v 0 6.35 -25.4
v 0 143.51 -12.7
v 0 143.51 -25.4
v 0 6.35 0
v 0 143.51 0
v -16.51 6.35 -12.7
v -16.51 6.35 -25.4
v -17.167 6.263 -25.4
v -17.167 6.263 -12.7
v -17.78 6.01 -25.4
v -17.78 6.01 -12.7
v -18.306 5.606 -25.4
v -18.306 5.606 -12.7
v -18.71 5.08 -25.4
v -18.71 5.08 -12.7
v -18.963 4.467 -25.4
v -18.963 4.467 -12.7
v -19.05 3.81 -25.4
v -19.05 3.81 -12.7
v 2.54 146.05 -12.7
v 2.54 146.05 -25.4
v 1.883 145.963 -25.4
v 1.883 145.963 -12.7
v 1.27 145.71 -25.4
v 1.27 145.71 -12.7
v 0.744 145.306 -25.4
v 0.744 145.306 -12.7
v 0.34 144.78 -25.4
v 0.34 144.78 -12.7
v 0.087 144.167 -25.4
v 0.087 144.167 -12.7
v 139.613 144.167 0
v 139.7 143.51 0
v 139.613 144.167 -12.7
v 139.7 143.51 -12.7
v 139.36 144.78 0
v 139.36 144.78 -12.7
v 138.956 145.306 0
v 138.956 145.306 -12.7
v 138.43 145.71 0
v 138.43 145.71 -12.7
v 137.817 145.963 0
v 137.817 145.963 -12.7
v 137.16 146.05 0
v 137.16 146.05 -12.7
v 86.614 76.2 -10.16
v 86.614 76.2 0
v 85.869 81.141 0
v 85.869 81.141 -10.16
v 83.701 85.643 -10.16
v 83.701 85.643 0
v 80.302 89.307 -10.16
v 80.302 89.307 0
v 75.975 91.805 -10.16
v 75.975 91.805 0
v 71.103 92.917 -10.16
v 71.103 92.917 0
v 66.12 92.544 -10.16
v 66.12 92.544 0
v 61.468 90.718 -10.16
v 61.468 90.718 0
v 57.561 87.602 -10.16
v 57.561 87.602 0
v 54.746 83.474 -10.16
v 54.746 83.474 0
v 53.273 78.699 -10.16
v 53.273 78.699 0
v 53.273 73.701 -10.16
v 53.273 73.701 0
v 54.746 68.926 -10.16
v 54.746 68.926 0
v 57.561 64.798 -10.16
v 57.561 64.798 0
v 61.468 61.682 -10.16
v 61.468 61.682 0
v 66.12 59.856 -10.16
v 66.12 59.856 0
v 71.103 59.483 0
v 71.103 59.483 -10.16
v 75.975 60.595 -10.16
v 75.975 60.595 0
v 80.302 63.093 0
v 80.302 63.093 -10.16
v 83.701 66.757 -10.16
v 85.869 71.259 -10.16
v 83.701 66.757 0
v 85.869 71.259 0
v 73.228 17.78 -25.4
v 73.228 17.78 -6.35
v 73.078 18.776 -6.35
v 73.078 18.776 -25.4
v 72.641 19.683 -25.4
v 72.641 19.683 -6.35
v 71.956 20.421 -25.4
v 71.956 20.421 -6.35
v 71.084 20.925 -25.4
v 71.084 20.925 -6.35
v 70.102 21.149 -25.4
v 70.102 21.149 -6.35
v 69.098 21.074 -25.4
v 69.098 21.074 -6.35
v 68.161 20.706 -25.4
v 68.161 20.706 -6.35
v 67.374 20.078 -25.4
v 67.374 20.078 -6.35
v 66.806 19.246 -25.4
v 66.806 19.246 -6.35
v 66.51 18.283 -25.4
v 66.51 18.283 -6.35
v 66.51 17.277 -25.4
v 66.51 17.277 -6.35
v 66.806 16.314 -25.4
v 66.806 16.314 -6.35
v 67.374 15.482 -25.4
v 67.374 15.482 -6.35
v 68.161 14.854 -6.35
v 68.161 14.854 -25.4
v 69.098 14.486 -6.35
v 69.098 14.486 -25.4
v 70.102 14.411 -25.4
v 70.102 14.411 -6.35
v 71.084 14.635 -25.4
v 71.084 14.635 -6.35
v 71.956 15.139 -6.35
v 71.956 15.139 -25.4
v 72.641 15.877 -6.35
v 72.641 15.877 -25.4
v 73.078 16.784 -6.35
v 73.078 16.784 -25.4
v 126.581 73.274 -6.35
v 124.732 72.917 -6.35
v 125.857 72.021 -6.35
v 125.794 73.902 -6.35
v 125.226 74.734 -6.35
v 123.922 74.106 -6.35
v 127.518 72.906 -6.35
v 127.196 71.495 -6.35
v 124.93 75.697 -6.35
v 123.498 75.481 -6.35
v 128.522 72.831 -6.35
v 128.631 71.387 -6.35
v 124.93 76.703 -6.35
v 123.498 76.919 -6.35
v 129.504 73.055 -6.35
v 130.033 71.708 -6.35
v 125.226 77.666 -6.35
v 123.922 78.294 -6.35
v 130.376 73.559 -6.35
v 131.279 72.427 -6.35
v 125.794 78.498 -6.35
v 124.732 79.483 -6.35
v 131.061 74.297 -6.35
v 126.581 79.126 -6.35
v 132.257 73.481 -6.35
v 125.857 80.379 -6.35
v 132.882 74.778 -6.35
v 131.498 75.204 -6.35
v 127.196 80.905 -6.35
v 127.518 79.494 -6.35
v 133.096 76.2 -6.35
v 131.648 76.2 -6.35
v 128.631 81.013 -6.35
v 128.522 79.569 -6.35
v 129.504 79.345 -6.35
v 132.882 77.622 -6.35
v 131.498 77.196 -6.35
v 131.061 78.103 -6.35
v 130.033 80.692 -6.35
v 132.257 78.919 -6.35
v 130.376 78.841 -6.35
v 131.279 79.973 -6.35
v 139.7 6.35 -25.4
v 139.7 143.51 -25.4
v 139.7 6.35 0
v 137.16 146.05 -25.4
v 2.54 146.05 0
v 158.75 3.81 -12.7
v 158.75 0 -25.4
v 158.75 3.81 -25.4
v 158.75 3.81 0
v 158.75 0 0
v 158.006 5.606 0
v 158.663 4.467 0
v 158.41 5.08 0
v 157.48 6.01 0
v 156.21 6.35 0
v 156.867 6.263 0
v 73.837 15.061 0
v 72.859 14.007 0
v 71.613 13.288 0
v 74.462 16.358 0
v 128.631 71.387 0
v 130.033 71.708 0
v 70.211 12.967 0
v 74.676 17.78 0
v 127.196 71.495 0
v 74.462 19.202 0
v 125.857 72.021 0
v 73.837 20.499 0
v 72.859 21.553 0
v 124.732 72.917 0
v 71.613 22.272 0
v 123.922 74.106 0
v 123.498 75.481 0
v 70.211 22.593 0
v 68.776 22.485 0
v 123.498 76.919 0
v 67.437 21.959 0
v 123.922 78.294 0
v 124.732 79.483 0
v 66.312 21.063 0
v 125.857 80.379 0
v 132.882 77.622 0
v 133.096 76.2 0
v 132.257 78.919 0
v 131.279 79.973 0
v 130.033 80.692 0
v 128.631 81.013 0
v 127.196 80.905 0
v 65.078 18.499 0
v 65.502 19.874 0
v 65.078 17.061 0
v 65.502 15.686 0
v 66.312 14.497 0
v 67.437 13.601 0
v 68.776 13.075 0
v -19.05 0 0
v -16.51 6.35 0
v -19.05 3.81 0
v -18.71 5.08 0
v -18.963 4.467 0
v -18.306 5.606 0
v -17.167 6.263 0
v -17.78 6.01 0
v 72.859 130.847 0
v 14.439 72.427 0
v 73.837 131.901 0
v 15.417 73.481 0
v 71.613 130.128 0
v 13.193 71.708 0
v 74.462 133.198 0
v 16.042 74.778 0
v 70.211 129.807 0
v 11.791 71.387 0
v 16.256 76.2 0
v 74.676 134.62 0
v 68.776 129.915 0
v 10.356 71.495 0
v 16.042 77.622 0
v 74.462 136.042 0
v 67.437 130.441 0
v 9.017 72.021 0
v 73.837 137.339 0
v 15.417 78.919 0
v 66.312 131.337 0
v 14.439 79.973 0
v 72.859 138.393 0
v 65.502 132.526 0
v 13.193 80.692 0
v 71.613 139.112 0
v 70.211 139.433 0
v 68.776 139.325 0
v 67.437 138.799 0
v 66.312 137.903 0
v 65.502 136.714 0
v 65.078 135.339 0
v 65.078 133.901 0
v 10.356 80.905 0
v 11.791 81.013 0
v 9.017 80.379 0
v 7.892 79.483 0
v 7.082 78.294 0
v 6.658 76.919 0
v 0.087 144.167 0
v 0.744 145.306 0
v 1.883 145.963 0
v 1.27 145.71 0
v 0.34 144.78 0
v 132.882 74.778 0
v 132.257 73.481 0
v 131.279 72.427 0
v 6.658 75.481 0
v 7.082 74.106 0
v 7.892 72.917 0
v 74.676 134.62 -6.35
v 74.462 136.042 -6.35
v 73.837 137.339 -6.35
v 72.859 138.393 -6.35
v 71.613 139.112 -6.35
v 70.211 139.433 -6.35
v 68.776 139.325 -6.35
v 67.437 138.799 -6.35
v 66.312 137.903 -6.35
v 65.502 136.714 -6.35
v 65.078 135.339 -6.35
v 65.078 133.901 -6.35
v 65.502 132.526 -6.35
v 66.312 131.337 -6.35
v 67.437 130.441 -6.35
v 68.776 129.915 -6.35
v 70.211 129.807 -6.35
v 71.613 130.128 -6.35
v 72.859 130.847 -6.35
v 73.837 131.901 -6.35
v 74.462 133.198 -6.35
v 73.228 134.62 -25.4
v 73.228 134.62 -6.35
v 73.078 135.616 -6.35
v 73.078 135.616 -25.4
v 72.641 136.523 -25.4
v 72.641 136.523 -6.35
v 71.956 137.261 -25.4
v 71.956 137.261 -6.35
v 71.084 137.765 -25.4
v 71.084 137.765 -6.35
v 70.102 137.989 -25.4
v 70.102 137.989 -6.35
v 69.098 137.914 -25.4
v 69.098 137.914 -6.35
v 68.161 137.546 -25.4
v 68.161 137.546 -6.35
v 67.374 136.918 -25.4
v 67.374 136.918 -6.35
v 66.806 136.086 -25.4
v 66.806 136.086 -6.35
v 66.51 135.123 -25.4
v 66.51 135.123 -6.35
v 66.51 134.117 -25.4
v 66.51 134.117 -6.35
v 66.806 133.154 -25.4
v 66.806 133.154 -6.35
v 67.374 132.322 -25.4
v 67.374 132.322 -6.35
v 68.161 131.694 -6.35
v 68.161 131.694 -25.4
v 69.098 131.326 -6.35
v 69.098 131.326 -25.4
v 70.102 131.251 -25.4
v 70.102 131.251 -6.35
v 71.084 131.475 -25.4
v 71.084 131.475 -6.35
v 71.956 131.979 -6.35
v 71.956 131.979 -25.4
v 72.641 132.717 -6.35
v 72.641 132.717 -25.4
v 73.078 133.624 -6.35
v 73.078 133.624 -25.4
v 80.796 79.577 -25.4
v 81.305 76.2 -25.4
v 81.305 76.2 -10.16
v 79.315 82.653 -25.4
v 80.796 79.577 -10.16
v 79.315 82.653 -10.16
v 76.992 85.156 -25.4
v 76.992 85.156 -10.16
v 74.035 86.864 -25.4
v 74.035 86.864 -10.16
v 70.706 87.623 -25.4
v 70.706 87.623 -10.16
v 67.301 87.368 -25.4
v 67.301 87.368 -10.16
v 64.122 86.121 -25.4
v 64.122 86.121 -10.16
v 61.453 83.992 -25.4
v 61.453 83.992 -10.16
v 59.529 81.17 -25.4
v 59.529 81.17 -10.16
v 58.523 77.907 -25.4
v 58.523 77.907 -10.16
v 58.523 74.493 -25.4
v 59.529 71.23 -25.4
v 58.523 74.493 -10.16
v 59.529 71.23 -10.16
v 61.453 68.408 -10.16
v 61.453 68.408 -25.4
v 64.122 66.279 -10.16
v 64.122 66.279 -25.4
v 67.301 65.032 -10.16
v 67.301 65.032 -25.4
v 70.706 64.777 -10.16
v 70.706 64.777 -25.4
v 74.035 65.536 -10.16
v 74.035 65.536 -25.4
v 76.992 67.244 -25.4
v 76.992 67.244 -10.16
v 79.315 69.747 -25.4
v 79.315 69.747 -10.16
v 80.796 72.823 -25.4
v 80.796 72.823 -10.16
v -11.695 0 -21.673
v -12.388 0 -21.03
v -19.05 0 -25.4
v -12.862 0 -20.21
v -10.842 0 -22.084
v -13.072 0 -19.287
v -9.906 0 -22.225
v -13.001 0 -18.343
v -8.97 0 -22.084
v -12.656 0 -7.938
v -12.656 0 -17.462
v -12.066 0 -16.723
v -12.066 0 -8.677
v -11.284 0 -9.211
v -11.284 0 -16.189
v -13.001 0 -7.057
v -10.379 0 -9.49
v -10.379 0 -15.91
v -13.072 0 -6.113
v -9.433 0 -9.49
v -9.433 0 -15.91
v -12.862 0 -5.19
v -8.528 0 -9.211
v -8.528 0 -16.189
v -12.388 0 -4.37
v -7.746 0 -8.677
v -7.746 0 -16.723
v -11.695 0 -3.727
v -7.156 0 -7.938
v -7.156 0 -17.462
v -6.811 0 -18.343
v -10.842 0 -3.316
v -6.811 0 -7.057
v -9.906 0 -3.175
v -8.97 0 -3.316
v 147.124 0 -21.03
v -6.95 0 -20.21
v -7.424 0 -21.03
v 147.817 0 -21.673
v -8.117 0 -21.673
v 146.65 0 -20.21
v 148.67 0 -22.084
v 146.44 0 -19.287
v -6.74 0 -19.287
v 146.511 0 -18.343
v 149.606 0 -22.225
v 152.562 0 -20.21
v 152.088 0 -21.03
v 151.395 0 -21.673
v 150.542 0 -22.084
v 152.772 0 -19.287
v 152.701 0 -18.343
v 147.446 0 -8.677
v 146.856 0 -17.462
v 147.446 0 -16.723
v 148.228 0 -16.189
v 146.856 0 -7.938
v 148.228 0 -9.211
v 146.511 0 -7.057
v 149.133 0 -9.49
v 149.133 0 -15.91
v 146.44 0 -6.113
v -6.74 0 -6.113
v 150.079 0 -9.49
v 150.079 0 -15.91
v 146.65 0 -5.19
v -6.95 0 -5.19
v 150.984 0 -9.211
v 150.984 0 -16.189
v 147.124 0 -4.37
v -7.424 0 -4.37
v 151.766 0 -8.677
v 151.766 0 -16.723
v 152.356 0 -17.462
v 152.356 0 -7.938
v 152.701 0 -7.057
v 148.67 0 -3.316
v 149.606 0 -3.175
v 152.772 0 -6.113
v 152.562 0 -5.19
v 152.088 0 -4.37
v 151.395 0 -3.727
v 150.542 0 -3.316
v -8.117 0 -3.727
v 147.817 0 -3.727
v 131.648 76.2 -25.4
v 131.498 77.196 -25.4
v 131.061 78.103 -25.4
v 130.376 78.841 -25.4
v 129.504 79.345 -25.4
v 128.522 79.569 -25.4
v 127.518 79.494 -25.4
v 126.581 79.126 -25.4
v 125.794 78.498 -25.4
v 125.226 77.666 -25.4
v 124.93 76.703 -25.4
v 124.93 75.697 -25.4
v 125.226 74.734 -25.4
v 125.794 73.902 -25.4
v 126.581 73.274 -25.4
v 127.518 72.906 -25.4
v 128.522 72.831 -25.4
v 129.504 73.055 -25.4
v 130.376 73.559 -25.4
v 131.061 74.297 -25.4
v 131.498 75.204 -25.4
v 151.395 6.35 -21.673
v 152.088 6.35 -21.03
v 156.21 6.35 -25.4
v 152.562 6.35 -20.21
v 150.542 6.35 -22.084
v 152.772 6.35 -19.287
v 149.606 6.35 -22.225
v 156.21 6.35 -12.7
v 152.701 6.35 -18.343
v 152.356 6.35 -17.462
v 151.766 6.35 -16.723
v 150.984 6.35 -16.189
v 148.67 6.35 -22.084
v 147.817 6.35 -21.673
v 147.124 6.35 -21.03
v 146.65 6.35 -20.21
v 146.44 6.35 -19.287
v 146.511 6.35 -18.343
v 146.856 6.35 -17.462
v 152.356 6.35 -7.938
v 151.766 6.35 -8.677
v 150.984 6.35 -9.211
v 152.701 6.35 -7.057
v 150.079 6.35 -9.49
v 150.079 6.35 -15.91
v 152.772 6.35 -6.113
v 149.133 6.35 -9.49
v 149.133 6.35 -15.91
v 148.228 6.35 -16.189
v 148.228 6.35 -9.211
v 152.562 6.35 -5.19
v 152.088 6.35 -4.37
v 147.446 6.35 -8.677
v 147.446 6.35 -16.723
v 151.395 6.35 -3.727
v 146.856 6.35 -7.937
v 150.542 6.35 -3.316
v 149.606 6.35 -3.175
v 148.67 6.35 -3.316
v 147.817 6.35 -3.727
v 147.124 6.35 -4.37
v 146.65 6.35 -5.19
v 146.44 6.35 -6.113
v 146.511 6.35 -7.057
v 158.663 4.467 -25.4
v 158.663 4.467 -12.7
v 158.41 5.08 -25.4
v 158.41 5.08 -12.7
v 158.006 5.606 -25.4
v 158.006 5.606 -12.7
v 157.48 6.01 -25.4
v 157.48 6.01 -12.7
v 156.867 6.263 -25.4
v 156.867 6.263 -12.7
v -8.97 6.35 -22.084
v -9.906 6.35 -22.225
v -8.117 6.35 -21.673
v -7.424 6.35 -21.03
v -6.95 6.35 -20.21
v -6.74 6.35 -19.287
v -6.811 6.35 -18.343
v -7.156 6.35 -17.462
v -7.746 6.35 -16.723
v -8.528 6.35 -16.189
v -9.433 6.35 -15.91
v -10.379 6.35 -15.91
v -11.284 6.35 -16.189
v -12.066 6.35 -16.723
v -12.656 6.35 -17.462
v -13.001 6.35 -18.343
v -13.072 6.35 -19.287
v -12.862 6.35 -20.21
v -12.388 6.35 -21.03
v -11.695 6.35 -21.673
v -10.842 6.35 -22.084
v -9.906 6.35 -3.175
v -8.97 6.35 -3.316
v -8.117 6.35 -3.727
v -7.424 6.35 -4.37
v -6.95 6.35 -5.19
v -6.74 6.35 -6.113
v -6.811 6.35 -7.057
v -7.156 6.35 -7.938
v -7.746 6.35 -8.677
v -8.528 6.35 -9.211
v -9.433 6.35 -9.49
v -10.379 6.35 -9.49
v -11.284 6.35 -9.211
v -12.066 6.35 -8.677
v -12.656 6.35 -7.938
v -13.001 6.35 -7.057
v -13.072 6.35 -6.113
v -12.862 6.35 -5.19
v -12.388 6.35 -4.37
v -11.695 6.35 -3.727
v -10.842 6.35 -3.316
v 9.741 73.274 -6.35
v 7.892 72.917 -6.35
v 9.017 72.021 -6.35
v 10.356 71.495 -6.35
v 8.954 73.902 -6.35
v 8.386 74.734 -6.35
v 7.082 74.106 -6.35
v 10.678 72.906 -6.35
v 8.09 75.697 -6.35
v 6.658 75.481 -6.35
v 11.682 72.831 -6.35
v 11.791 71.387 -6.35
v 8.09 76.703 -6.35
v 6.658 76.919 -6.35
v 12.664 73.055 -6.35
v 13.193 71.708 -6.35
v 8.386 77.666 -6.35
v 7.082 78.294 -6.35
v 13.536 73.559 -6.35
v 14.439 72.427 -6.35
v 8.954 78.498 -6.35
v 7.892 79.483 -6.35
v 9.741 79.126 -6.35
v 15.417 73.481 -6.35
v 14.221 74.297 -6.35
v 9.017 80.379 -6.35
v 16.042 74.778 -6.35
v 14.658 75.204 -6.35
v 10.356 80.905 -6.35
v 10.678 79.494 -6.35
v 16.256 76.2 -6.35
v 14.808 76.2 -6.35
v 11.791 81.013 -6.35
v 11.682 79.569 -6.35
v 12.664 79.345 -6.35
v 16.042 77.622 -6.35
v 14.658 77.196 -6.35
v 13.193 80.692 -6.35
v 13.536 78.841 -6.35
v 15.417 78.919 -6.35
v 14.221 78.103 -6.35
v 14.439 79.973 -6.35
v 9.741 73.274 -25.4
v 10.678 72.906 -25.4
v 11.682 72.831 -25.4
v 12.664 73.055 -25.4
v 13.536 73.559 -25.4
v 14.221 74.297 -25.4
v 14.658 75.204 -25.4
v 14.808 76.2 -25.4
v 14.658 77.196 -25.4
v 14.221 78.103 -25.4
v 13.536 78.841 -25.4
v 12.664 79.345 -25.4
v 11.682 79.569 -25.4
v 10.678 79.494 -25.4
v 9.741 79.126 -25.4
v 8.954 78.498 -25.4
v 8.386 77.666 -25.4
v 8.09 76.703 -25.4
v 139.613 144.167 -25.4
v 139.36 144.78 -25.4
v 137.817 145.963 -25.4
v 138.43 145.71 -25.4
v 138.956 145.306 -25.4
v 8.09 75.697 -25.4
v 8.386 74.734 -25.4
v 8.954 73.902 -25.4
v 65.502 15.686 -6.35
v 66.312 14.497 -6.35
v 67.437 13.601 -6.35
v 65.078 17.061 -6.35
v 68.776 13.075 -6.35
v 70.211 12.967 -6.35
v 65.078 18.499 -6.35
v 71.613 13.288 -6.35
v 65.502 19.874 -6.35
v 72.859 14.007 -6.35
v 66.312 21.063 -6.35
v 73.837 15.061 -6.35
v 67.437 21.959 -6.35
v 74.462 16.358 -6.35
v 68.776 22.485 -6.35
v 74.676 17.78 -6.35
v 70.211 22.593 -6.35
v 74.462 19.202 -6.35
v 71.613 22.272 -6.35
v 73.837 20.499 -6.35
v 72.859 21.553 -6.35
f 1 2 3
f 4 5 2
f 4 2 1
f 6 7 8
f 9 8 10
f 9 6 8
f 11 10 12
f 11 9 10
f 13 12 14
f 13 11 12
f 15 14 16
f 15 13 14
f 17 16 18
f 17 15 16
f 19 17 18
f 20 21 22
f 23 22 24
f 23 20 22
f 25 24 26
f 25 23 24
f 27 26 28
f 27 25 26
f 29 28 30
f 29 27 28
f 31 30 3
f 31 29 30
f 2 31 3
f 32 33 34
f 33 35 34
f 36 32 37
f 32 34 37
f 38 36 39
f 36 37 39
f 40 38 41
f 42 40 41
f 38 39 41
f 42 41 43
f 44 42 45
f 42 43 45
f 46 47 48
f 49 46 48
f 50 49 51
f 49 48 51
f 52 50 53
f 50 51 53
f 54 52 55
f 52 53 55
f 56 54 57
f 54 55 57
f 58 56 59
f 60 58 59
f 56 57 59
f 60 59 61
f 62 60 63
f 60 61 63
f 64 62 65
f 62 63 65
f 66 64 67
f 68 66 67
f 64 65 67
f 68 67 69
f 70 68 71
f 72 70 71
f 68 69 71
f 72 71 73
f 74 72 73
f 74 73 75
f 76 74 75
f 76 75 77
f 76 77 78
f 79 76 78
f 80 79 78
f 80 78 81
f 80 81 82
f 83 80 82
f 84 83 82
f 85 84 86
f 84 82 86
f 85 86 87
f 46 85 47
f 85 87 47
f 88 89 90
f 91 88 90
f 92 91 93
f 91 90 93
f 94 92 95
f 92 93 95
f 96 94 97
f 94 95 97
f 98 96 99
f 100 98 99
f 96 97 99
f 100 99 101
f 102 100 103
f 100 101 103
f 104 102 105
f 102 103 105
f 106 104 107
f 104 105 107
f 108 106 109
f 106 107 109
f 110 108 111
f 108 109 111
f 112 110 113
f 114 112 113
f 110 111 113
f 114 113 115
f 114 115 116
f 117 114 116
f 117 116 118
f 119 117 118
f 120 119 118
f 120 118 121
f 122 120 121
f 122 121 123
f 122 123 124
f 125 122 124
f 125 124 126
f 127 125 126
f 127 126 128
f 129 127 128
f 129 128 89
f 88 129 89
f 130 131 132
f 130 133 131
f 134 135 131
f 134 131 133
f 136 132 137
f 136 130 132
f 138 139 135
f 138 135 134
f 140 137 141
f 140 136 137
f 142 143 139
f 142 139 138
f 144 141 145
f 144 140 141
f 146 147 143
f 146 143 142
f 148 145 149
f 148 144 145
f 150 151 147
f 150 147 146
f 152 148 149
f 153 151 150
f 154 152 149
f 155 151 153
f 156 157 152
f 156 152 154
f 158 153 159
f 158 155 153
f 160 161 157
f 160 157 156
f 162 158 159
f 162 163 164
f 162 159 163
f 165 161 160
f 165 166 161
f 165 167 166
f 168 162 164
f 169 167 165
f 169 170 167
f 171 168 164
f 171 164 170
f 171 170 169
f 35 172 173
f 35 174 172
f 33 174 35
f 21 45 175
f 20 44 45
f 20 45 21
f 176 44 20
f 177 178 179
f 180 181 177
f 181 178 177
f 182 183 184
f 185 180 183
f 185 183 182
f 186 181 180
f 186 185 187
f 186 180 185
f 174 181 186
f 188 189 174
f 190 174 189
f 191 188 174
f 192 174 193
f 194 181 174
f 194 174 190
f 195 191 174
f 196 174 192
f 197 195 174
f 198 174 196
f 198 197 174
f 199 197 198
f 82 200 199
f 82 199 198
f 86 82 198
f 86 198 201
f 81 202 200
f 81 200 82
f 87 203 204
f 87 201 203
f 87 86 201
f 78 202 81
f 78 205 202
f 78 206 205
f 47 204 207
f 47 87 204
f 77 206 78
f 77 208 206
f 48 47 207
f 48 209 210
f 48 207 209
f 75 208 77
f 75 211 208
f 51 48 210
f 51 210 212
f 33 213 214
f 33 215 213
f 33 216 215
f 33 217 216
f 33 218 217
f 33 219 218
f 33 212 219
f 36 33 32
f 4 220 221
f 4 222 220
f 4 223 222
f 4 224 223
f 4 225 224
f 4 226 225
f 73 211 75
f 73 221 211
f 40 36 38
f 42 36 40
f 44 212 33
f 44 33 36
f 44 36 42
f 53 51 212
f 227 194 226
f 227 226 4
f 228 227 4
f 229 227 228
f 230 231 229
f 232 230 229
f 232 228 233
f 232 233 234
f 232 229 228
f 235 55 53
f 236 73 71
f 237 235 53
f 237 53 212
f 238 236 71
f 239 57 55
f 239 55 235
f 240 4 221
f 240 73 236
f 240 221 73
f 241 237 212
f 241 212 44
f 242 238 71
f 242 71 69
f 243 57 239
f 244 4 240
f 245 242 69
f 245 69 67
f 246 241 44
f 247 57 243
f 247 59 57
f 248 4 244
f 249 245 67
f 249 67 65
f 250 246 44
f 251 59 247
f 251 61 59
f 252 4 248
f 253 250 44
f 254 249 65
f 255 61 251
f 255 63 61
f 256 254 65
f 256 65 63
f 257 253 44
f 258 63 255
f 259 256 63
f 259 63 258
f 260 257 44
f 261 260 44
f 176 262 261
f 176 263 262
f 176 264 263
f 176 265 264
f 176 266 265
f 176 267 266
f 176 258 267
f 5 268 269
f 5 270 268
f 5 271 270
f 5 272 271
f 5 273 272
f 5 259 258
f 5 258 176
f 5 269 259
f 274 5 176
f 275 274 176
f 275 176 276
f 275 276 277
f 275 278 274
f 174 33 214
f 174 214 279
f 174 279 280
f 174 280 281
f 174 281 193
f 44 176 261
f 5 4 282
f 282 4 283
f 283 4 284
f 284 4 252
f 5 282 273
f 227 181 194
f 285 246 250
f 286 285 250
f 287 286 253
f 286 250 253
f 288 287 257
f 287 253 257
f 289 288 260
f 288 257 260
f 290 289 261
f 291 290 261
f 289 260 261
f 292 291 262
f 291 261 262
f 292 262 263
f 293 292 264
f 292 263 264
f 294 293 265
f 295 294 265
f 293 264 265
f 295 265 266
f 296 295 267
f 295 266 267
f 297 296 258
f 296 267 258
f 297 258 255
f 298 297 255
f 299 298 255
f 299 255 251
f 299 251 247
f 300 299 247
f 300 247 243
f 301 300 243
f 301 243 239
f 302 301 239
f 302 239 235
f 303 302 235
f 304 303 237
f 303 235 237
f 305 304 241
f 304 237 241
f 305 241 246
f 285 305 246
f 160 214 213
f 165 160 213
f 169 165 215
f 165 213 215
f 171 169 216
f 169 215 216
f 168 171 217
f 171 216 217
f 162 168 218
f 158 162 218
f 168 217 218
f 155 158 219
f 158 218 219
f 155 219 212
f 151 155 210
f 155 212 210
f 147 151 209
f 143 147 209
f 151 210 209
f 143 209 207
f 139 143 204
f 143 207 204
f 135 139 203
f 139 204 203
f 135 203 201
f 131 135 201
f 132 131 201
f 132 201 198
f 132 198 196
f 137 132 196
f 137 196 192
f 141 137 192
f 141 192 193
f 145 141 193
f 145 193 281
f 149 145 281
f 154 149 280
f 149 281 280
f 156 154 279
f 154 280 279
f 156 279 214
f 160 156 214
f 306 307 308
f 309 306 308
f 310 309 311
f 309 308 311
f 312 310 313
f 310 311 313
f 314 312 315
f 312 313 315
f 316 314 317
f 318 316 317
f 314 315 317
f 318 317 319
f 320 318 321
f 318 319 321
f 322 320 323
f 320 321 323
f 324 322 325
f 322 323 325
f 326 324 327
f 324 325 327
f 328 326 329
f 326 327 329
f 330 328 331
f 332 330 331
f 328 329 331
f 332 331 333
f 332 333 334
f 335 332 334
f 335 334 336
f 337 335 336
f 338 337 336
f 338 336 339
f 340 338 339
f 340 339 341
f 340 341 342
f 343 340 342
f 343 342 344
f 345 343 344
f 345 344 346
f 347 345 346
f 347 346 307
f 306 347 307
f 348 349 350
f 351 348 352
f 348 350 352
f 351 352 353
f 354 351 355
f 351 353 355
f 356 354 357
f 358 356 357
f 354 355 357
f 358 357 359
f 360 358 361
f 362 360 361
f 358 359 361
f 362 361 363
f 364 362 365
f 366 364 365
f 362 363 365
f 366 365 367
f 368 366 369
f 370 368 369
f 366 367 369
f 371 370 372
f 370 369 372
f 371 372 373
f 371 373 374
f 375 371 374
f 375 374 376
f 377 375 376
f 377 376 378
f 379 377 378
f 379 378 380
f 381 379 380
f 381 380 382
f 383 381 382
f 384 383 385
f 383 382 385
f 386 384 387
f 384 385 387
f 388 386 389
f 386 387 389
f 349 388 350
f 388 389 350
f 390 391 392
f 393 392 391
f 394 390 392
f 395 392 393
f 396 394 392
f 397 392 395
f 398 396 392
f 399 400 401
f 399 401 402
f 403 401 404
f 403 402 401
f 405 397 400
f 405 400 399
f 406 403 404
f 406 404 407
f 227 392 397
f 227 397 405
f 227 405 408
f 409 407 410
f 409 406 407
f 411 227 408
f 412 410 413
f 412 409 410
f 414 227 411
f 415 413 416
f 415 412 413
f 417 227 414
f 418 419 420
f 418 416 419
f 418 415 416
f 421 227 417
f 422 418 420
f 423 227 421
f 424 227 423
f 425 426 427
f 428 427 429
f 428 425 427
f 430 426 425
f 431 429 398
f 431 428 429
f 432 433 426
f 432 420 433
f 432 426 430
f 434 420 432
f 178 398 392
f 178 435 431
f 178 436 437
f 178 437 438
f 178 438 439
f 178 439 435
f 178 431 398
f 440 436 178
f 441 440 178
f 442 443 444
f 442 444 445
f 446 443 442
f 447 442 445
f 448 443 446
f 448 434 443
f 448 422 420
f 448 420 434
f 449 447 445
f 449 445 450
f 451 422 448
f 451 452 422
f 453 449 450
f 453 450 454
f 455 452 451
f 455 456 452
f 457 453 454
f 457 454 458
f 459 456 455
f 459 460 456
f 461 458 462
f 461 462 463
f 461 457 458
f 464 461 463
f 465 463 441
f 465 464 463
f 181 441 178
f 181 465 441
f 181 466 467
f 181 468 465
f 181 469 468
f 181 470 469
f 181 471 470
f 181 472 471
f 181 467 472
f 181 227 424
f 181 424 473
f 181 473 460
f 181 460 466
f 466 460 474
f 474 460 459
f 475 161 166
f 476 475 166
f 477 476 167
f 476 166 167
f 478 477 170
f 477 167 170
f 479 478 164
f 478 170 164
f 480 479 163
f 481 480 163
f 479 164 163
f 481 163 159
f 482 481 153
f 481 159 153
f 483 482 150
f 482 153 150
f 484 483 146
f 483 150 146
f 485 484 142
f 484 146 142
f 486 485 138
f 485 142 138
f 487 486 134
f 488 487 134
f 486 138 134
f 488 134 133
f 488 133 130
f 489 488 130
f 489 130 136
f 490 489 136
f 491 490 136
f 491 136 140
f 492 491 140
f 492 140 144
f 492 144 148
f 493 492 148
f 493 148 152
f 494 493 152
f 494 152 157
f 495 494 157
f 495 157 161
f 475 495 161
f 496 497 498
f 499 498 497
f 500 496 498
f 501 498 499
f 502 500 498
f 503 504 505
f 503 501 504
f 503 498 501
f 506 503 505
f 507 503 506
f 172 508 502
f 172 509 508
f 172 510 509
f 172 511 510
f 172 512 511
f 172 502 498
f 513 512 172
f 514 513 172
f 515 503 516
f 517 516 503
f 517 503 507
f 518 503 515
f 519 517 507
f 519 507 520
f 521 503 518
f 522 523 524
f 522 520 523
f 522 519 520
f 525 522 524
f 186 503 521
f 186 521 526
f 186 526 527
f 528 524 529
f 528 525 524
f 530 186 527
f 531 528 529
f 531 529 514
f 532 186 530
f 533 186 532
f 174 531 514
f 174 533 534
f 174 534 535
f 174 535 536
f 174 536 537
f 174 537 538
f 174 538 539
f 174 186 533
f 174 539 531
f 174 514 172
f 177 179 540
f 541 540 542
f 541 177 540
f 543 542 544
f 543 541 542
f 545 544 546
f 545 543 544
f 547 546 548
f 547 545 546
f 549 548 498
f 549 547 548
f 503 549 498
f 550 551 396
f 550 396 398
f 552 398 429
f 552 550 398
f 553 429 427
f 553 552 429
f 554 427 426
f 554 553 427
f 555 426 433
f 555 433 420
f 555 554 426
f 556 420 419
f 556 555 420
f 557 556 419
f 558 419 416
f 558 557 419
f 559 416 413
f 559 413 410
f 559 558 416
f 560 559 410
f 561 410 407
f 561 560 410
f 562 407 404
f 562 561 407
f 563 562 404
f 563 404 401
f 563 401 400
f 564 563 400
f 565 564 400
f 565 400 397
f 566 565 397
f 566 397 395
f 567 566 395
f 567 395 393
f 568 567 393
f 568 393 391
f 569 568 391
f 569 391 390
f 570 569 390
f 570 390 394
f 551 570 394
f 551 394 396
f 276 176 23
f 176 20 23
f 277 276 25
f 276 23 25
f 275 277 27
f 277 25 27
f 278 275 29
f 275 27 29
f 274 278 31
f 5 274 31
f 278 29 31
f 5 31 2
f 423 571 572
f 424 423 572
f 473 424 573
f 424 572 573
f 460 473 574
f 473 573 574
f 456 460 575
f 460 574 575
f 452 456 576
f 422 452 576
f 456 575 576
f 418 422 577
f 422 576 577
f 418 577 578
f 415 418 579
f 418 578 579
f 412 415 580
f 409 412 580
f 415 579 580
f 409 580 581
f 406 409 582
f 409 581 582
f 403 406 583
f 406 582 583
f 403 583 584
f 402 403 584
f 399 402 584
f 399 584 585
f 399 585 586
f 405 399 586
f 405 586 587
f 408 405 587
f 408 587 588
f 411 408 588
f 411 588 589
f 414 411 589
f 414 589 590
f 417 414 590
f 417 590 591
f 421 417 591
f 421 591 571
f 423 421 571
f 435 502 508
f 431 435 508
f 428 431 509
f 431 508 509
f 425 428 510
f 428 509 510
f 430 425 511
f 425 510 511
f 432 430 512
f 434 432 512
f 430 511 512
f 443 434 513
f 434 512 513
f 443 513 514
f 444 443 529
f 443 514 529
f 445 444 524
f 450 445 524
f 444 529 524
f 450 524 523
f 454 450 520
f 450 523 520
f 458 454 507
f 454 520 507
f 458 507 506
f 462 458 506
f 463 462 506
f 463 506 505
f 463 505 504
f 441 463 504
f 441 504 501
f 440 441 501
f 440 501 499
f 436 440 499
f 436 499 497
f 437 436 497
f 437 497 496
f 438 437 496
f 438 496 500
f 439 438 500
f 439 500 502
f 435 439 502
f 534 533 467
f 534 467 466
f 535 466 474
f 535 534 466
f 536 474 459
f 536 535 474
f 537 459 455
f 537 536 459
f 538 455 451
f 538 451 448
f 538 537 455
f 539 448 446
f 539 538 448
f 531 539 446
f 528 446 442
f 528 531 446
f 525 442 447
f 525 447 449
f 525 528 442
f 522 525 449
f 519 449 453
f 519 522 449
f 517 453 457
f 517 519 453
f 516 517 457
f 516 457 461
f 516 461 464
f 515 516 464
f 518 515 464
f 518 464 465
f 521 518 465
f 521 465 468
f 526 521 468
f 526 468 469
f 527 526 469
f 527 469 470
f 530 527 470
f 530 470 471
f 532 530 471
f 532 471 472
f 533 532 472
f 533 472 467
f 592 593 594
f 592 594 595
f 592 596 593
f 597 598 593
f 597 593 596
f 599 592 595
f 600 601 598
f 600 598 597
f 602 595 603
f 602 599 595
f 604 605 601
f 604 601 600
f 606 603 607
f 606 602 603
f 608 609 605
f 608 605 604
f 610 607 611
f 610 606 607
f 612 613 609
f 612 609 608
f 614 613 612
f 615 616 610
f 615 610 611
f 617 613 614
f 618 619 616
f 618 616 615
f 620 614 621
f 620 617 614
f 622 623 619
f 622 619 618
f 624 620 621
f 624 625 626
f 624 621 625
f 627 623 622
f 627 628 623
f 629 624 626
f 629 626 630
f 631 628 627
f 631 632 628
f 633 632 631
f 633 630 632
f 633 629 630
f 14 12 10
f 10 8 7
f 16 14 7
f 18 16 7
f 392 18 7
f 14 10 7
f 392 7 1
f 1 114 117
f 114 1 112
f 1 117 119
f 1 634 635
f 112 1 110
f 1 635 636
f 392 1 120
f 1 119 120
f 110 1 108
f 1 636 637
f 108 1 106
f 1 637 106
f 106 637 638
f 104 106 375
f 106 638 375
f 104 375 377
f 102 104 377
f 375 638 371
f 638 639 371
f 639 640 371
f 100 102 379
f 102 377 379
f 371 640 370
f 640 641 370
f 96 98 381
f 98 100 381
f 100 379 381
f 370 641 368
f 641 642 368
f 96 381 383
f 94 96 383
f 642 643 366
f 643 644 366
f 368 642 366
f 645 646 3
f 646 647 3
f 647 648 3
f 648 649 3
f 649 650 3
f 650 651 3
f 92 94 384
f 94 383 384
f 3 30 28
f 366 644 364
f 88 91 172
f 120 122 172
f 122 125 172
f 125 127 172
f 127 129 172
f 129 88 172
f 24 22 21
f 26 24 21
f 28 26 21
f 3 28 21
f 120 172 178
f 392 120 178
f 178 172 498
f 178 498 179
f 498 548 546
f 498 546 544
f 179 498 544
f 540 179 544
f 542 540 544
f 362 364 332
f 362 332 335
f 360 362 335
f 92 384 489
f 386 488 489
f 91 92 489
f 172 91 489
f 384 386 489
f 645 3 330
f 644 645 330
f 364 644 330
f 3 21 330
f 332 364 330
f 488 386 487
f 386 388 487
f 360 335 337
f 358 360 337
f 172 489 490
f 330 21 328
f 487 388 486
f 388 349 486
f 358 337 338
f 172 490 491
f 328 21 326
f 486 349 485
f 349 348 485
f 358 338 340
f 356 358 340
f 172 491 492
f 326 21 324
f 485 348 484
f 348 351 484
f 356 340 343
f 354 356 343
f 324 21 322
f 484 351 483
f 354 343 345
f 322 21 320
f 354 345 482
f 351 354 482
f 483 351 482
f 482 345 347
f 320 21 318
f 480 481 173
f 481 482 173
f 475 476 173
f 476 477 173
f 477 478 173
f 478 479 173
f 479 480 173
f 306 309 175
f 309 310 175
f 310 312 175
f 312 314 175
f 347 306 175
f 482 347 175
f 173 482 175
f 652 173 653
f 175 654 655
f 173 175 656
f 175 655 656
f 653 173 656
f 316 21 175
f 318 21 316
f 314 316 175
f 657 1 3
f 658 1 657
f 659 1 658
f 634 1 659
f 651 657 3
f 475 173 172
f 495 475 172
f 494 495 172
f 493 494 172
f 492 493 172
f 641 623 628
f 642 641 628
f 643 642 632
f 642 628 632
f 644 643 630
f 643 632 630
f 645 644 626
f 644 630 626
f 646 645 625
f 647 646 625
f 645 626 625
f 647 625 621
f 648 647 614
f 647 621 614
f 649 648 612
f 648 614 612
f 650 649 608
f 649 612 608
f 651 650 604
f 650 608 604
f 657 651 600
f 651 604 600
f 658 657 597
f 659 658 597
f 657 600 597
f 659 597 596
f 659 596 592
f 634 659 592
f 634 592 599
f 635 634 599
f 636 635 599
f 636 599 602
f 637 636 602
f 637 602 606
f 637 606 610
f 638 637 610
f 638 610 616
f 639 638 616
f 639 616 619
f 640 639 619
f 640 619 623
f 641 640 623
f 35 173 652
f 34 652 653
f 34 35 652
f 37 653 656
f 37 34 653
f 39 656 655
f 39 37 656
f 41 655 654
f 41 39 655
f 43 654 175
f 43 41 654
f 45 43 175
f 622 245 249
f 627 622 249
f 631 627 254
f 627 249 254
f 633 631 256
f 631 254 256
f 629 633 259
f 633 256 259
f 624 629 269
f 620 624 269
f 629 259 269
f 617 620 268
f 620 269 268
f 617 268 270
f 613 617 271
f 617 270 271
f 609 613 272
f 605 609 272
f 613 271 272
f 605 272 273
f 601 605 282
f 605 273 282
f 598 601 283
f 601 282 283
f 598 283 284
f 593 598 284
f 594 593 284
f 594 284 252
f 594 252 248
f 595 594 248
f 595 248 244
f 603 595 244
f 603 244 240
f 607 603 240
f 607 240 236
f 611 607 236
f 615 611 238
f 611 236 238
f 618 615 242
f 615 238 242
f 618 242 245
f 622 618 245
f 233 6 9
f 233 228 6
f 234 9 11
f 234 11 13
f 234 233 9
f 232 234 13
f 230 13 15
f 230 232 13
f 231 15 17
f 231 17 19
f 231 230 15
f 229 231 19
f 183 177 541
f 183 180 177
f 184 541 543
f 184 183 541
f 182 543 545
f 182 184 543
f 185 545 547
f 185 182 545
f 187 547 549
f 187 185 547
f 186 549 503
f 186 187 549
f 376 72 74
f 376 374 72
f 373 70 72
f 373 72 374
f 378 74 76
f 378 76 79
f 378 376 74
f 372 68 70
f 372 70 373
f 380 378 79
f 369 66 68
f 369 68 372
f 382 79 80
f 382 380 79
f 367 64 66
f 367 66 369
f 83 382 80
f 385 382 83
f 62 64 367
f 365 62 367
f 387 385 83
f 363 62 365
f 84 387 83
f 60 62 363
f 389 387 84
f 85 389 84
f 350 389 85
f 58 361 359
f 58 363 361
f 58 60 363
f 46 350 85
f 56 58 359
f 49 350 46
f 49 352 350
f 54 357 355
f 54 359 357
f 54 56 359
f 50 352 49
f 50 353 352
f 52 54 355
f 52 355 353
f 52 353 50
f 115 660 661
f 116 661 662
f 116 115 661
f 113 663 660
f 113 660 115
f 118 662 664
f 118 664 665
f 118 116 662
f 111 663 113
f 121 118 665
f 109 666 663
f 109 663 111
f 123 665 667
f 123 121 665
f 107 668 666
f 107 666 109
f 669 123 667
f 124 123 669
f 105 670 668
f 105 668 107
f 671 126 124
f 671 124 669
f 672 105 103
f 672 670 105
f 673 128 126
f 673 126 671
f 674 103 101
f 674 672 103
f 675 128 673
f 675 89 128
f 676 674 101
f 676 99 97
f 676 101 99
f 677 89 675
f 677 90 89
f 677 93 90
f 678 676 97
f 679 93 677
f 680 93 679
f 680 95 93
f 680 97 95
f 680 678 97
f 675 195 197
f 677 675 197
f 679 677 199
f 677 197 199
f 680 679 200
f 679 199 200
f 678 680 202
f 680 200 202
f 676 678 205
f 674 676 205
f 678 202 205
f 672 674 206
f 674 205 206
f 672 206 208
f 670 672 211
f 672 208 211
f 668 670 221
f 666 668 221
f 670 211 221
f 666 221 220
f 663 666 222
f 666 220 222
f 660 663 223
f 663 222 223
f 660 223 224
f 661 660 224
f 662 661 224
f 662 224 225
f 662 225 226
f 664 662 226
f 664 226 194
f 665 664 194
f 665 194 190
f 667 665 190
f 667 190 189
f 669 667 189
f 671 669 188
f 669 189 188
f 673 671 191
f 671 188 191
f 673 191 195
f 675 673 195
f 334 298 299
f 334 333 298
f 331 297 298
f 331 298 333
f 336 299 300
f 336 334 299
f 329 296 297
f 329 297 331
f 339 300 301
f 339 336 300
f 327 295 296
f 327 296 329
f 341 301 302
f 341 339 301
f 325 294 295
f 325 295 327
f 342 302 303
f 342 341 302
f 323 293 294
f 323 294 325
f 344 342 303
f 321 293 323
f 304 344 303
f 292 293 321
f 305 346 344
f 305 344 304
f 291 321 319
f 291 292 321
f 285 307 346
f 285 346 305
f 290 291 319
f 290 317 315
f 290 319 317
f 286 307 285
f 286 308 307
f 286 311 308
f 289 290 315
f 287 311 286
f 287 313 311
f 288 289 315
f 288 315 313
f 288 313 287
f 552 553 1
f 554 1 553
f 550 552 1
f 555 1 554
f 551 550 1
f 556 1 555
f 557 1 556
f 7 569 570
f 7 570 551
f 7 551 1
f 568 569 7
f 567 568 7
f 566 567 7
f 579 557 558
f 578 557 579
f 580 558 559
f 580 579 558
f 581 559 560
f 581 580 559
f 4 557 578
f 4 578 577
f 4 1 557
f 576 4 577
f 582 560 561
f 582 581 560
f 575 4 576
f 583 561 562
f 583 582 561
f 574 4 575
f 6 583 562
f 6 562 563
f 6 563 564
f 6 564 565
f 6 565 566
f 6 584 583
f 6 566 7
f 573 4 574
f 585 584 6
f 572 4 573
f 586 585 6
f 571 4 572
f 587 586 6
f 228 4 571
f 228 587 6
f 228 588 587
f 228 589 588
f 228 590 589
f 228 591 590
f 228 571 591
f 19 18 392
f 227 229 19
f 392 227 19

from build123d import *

# Parameters (mm, degrees)
SKETCH1_W               = 139.7
SKETCH1_H               = 12.7
BOSS_EXTRUDE1_DEPTH     = 146.05
SKETCH2_W               = 12.7
SKETCH2_H               = 6.35
BOSS_EXTRUDE2_DEPTH     = 19.05
CUT_EXTRUDE4_REACH      = 213.847
SKETCH6_R               = 3.175
FILLET1_R               = 2.54
SKETCH3_R               = 16.764
CUT_EXTRUDE5_DEPTH      = 10.16
SKETCH7_R               = 11.4554
CUT_EXTRUDE6_DEPTH      = 216.952287786
BOSS_EXTRUDE3_DEPTH     = 12.7
MIRROR3_COPY_1_REACH    = 213.847
MIRROR3_COPY_1_SKETCH_R = 3.175
SKETCH10_R              = 3.3782
CUT_EXTRUDE8_DEPTH      = 218.203418481
SKETCH11_R              = 4.826
CUT_EXTRUDE9_DEPTH      = 6.35
SKETCH12_R              = 11.4554
CUT_EXTRUDE10_DEPTH     = 217.086683995


with BuildPart() as part:
    # Sketch1 → Boss-Extrude1 (new body)
    with BuildSketch(Plane(origin=(0, 0, 0), x_dir=(1, 0, 0), z_dir=(0, 1, 0))):
        with Locations((69.85, 6.35)):
            Rectangle(SKETCH1_W, SKETCH1_H)
    extrude(amount=BOSS_EXTRUDE1_DEPTH)

    # Sketch2 → Boss-Extrude2 (add)
    with BuildSketch(Plane.ZY):
        with Locations((-6.35, 3.175)):
            Rectangle(SKETCH2_W, SKETCH2_H)
    boss_extrude2 = extrude(amount=BOSS_EXTRUDE2_DEPTH)

    # Mirror1: Boss-Extrude2 across plane
    add(boss_extrude2.mirror(Plane.ZY.offset(-69.85)))

    # Sketch6 → Cut-Extrude4 (cut, up to next)
    with BuildSketch(Plane(origin=(0, 6.35, 0), x_dir=(1, 0, 0), z_dir=(0, 1, 0)), mode=Mode.PRIVATE) as cut_extrude4_sk1:
        with Locations(Location((-9.906, 6.35, 0), (0, 0, 270))):
            Circle(SKETCH6_R)
    cut_extrude4_tool1 = extrude(cut_extrude4_sk1.sketch, amount=-CUT_EXTRUDE4_REACH, mode=Mode.PRIVATE) & part.part
    cut_extrude4 = cut_extrude4_tool1.solids().sort_by_distance((-9.906, 6.35, -6.35))[0]
    add(cut_extrude4, mode=Mode.SUBTRACT)

    # Mirror2: Cut-Extrude4 across plane
    add(cut_extrude4.mirror(Plane.ZY.offset(-69.85)), mode=Mode.SUBTRACT)

    # Fillet1
    fillet1_edges = [part.edges().sort_by_distance(p)[0] for p in [
        (139.7, 146.05, -6.35),
        (-19.05, 6.35, -6.35),
        (158.75, 6.35, -6.35),
        (0, 146.05, -6.35),
    ]]
    fillet(fillet1_edges, radius=FILLET1_R)

    # Sketch3 → Cut-Extrude5 (cut)
    with BuildSketch(Plane.XY):
        with Locations((69.85, 76.2)):
            Circle(SKETCH3_R)
    extrude(amount=-CUT_EXTRUDE5_DEPTH, mode=Mode.SUBTRACT)

    # Sketch7 → Cut-Extrude6 (cut, through all)
    with BuildSketch(Plane.XY.offset(-10.16)):
        with Locations((69.85, 76.2)):
            Circle(SKETCH7_R)
    extrude(amount=-CUT_EXTRUDE6_DEPTH, mode=Mode.SUBTRACT)

    # Sketch8 → Boss-Extrude3 (add)
    with BuildSketch(Plane(origin=(0, 0, -12.7), x_dir=(-1, 0, 0), z_dir=(0, 0, -1))):
        with BuildLine():
            Line((-137.16, 146.05), (-2.54, 146.05))
            ThreePointArc((-2.54, 146.05), (-0.743948776, 145.306051224), (0, 143.51))
            Line((0, 143.51), (0, 6.35))
            Line((0, 6.35), (16.51, 6.35))
            ThreePointArc((16.51, 6.35), (18.306051224, 5.606051224), (19.05, 3.81))
            Line((19.05, 3.81), (19.05, 0))
            Line((19.05, 0), (-158.75, 0))
            Line((-158.75, 0), (-158.75, 3.81))
            ThreePointArc((-158.75, 3.81), (-158.006051224, 5.606051224), (-156.21, 6.35))
            Line((-156.21, 6.35), (-139.7, 6.35))
            Line((-139.7, 6.35), (-139.7, 143.51))
            ThreePointArc((-139.7, 143.51), (-138.956051224, 145.306051224), (-137.16, 146.05))
        make_face()
    extrude(amount=BOSS_EXTRUDE3_DEPTH)

    # Mirror3: Cut-Extrude4 across plane
    add(cut_extrude4.mirror(Plane(origin=(0, 0, -12.7), x_dir=(1, 0, 0), z_dir=(0, 0, -1))), mode=Mode.SUBTRACT)

    # Mirror3 copy 1 sketch → Mirror3 copy 1 (cut, up to next)
    with BuildSketch(Plane(origin=(139.7, 6.35, -25.4), x_dir=(-1, 0, 0), z_dir=(0, 1, 0)), mode=Mode.PRIVATE) as mirror3_copy_1_sk1:
        with Locations(Location((-9.906, 6.35, 0), (0, 0, 270))):
            Circle(MIRROR3_COPY_1_SKETCH_R)
    mirror3_copy_1_tool1 = extrude(mirror3_copy_1_sk1.sketch, amount=-MIRROR3_COPY_1_REACH, mode=Mode.PRIVATE) & part.part
    add(mirror3_copy_1_tool1.solids().sort_by_distance((149.606, 6.35, -19.05))[0], mode=Mode.SUBTRACT)

    # Sketch10 → Cut-Extrude8 (cut, through all)
    with BuildSketch(Plane.XY):
        with Locations((11.43, 76.2)):
            Circle(SKETCH10_R)
        with Locations((69.85, 134.62)):
            Circle(SKETCH10_R)
        with Locations((128.27, 76.2)):
            Circle(SKETCH10_R)
        with Locations((69.85, 17.78)):
            Circle(SKETCH10_R)
    extrude(amount=-CUT_EXTRUDE8_DEPTH, mode=Mode.SUBTRACT)

    # Sketch11 → Cut-Extrude9 (cut)
    with BuildSketch(Plane.XY):
        with Locations((11.43, 76.2)):
            Circle(SKETCH11_R)
        with Locations((69.85, 134.62)):
            Circle(SKETCH11_R)
        with Locations((128.27, 76.2)):
            Circle(SKETCH11_R)
        with Locations((69.85, 17.78)):
            Circle(SKETCH11_R)
    extrude(amount=-CUT_EXTRUDE9_DEPTH, mode=Mode.SUBTRACT)

    # Sketch12 → Cut-Extrude10 (cut, through all)
    with BuildSketch(Plane.XY.offset(-12.7)):
        with Locations((69.85, 76.2)):
            Circle(SKETCH12_R)
    extrude(amount=-CUT_EXTRUDE10_DEPTH, mode=Mode.SUBTRACT)


solid = part.part
